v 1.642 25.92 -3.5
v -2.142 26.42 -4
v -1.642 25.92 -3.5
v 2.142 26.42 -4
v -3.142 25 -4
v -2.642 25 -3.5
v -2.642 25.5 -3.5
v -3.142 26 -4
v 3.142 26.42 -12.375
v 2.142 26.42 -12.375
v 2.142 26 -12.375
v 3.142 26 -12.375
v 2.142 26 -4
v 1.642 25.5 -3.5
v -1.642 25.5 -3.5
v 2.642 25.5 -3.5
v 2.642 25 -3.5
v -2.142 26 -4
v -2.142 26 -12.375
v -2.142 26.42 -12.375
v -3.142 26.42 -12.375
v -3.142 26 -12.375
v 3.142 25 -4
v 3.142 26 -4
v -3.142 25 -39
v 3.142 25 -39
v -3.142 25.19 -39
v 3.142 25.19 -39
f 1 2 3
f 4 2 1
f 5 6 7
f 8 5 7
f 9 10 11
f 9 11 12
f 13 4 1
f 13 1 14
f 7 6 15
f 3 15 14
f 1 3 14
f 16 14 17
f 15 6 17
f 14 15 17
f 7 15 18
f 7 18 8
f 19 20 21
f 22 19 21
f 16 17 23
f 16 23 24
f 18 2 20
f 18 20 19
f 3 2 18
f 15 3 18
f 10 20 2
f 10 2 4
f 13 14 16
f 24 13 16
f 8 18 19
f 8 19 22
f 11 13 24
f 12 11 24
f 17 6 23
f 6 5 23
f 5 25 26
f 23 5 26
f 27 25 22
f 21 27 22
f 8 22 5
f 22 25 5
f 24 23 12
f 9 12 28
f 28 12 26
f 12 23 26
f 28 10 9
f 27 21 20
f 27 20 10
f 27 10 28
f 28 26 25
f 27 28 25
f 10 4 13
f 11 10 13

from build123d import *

# Parameters (mm, degrees)
PAD003_DEPTH            = 1.42
POCKET004_DEPTH         = 8.875
POCKET005_DEPTH         = 6.285457
CHAMFER002_SIZE         = 0.5
BODY001_PLACEMENT_ANGLE = 180


with BuildPart() as part:
    # Sketch010 → Pad003 (new body)
    with BuildSketch(Plane.XZ):
        Polygon((-3.142229, 35.5), (3.142229, 35.5), (3.142229, 44.375), (3.142229, 71), (-3.142229, 71), (-3.142229, 44.375), align=None)
    extrude(amount=PAD003_DEPTH)

    # Sketch011 (on Face1 of Pad003) → Pocket004 (cut)
    with BuildSketch(Plane(origin=(0, 0, 35.5), x_dir=(1, 0, 0), z_dir=(0, 0, -1))):
        Polygon((-2.142229, 1.42), (-2.142229, 1), (-7.142229, 1), (-7.142229, 4.921038), align=None)
        Polygon((7.142229, 4.921038), (2.142229, 1.42), (2.142229, 1), (7.142229, 1), align=None)
    extrude(amount=-POCKET004_DEPTH, mode=Mode.SUBTRACT)

    # Sketch012 (on Face9 of Pocket004) → Pocket005 (cut, through all)
    with BuildSketch(Plane(origin=(-3.142229, 0, 0), x_dir=(0, 0, -1), z_dir=(-1, 0, 0))):
        Polygon((-71, 0.19), (-71, 14.02), (-44.375, 1.42), align=None)
    extrude(amount=-POCKET005_DEPTH, mode=Mode.SUBTRACT)

    # Chamfer002
    chamfer002_edges = [part.edges().sort_by_distance(p)[0] for p in [
        (-2.642229, -1, 35.5),
        (-2.142229, -1.21, 35.5),
        (0, -1.42, 35.5),
        (2.142229, -1.21, 35.5),
        (2.642229, -1, 35.5),
        (-3.142229, -0.5, 35.5),
        (3.142229, -0.5, 35.5),
    ]]
    chamfer(chamfer002_edges, length=CHAMFER002_SIZE)


with BuildPart() as part_1:
    # Body001 placement: moved
    add(part.part.moved(Location((0, 25, 32))).rotate(Axis((0, 25, 32), (-1, 0, 0)), BODY001_PLACEMENT_ANGLE))


solid = part_1.part
